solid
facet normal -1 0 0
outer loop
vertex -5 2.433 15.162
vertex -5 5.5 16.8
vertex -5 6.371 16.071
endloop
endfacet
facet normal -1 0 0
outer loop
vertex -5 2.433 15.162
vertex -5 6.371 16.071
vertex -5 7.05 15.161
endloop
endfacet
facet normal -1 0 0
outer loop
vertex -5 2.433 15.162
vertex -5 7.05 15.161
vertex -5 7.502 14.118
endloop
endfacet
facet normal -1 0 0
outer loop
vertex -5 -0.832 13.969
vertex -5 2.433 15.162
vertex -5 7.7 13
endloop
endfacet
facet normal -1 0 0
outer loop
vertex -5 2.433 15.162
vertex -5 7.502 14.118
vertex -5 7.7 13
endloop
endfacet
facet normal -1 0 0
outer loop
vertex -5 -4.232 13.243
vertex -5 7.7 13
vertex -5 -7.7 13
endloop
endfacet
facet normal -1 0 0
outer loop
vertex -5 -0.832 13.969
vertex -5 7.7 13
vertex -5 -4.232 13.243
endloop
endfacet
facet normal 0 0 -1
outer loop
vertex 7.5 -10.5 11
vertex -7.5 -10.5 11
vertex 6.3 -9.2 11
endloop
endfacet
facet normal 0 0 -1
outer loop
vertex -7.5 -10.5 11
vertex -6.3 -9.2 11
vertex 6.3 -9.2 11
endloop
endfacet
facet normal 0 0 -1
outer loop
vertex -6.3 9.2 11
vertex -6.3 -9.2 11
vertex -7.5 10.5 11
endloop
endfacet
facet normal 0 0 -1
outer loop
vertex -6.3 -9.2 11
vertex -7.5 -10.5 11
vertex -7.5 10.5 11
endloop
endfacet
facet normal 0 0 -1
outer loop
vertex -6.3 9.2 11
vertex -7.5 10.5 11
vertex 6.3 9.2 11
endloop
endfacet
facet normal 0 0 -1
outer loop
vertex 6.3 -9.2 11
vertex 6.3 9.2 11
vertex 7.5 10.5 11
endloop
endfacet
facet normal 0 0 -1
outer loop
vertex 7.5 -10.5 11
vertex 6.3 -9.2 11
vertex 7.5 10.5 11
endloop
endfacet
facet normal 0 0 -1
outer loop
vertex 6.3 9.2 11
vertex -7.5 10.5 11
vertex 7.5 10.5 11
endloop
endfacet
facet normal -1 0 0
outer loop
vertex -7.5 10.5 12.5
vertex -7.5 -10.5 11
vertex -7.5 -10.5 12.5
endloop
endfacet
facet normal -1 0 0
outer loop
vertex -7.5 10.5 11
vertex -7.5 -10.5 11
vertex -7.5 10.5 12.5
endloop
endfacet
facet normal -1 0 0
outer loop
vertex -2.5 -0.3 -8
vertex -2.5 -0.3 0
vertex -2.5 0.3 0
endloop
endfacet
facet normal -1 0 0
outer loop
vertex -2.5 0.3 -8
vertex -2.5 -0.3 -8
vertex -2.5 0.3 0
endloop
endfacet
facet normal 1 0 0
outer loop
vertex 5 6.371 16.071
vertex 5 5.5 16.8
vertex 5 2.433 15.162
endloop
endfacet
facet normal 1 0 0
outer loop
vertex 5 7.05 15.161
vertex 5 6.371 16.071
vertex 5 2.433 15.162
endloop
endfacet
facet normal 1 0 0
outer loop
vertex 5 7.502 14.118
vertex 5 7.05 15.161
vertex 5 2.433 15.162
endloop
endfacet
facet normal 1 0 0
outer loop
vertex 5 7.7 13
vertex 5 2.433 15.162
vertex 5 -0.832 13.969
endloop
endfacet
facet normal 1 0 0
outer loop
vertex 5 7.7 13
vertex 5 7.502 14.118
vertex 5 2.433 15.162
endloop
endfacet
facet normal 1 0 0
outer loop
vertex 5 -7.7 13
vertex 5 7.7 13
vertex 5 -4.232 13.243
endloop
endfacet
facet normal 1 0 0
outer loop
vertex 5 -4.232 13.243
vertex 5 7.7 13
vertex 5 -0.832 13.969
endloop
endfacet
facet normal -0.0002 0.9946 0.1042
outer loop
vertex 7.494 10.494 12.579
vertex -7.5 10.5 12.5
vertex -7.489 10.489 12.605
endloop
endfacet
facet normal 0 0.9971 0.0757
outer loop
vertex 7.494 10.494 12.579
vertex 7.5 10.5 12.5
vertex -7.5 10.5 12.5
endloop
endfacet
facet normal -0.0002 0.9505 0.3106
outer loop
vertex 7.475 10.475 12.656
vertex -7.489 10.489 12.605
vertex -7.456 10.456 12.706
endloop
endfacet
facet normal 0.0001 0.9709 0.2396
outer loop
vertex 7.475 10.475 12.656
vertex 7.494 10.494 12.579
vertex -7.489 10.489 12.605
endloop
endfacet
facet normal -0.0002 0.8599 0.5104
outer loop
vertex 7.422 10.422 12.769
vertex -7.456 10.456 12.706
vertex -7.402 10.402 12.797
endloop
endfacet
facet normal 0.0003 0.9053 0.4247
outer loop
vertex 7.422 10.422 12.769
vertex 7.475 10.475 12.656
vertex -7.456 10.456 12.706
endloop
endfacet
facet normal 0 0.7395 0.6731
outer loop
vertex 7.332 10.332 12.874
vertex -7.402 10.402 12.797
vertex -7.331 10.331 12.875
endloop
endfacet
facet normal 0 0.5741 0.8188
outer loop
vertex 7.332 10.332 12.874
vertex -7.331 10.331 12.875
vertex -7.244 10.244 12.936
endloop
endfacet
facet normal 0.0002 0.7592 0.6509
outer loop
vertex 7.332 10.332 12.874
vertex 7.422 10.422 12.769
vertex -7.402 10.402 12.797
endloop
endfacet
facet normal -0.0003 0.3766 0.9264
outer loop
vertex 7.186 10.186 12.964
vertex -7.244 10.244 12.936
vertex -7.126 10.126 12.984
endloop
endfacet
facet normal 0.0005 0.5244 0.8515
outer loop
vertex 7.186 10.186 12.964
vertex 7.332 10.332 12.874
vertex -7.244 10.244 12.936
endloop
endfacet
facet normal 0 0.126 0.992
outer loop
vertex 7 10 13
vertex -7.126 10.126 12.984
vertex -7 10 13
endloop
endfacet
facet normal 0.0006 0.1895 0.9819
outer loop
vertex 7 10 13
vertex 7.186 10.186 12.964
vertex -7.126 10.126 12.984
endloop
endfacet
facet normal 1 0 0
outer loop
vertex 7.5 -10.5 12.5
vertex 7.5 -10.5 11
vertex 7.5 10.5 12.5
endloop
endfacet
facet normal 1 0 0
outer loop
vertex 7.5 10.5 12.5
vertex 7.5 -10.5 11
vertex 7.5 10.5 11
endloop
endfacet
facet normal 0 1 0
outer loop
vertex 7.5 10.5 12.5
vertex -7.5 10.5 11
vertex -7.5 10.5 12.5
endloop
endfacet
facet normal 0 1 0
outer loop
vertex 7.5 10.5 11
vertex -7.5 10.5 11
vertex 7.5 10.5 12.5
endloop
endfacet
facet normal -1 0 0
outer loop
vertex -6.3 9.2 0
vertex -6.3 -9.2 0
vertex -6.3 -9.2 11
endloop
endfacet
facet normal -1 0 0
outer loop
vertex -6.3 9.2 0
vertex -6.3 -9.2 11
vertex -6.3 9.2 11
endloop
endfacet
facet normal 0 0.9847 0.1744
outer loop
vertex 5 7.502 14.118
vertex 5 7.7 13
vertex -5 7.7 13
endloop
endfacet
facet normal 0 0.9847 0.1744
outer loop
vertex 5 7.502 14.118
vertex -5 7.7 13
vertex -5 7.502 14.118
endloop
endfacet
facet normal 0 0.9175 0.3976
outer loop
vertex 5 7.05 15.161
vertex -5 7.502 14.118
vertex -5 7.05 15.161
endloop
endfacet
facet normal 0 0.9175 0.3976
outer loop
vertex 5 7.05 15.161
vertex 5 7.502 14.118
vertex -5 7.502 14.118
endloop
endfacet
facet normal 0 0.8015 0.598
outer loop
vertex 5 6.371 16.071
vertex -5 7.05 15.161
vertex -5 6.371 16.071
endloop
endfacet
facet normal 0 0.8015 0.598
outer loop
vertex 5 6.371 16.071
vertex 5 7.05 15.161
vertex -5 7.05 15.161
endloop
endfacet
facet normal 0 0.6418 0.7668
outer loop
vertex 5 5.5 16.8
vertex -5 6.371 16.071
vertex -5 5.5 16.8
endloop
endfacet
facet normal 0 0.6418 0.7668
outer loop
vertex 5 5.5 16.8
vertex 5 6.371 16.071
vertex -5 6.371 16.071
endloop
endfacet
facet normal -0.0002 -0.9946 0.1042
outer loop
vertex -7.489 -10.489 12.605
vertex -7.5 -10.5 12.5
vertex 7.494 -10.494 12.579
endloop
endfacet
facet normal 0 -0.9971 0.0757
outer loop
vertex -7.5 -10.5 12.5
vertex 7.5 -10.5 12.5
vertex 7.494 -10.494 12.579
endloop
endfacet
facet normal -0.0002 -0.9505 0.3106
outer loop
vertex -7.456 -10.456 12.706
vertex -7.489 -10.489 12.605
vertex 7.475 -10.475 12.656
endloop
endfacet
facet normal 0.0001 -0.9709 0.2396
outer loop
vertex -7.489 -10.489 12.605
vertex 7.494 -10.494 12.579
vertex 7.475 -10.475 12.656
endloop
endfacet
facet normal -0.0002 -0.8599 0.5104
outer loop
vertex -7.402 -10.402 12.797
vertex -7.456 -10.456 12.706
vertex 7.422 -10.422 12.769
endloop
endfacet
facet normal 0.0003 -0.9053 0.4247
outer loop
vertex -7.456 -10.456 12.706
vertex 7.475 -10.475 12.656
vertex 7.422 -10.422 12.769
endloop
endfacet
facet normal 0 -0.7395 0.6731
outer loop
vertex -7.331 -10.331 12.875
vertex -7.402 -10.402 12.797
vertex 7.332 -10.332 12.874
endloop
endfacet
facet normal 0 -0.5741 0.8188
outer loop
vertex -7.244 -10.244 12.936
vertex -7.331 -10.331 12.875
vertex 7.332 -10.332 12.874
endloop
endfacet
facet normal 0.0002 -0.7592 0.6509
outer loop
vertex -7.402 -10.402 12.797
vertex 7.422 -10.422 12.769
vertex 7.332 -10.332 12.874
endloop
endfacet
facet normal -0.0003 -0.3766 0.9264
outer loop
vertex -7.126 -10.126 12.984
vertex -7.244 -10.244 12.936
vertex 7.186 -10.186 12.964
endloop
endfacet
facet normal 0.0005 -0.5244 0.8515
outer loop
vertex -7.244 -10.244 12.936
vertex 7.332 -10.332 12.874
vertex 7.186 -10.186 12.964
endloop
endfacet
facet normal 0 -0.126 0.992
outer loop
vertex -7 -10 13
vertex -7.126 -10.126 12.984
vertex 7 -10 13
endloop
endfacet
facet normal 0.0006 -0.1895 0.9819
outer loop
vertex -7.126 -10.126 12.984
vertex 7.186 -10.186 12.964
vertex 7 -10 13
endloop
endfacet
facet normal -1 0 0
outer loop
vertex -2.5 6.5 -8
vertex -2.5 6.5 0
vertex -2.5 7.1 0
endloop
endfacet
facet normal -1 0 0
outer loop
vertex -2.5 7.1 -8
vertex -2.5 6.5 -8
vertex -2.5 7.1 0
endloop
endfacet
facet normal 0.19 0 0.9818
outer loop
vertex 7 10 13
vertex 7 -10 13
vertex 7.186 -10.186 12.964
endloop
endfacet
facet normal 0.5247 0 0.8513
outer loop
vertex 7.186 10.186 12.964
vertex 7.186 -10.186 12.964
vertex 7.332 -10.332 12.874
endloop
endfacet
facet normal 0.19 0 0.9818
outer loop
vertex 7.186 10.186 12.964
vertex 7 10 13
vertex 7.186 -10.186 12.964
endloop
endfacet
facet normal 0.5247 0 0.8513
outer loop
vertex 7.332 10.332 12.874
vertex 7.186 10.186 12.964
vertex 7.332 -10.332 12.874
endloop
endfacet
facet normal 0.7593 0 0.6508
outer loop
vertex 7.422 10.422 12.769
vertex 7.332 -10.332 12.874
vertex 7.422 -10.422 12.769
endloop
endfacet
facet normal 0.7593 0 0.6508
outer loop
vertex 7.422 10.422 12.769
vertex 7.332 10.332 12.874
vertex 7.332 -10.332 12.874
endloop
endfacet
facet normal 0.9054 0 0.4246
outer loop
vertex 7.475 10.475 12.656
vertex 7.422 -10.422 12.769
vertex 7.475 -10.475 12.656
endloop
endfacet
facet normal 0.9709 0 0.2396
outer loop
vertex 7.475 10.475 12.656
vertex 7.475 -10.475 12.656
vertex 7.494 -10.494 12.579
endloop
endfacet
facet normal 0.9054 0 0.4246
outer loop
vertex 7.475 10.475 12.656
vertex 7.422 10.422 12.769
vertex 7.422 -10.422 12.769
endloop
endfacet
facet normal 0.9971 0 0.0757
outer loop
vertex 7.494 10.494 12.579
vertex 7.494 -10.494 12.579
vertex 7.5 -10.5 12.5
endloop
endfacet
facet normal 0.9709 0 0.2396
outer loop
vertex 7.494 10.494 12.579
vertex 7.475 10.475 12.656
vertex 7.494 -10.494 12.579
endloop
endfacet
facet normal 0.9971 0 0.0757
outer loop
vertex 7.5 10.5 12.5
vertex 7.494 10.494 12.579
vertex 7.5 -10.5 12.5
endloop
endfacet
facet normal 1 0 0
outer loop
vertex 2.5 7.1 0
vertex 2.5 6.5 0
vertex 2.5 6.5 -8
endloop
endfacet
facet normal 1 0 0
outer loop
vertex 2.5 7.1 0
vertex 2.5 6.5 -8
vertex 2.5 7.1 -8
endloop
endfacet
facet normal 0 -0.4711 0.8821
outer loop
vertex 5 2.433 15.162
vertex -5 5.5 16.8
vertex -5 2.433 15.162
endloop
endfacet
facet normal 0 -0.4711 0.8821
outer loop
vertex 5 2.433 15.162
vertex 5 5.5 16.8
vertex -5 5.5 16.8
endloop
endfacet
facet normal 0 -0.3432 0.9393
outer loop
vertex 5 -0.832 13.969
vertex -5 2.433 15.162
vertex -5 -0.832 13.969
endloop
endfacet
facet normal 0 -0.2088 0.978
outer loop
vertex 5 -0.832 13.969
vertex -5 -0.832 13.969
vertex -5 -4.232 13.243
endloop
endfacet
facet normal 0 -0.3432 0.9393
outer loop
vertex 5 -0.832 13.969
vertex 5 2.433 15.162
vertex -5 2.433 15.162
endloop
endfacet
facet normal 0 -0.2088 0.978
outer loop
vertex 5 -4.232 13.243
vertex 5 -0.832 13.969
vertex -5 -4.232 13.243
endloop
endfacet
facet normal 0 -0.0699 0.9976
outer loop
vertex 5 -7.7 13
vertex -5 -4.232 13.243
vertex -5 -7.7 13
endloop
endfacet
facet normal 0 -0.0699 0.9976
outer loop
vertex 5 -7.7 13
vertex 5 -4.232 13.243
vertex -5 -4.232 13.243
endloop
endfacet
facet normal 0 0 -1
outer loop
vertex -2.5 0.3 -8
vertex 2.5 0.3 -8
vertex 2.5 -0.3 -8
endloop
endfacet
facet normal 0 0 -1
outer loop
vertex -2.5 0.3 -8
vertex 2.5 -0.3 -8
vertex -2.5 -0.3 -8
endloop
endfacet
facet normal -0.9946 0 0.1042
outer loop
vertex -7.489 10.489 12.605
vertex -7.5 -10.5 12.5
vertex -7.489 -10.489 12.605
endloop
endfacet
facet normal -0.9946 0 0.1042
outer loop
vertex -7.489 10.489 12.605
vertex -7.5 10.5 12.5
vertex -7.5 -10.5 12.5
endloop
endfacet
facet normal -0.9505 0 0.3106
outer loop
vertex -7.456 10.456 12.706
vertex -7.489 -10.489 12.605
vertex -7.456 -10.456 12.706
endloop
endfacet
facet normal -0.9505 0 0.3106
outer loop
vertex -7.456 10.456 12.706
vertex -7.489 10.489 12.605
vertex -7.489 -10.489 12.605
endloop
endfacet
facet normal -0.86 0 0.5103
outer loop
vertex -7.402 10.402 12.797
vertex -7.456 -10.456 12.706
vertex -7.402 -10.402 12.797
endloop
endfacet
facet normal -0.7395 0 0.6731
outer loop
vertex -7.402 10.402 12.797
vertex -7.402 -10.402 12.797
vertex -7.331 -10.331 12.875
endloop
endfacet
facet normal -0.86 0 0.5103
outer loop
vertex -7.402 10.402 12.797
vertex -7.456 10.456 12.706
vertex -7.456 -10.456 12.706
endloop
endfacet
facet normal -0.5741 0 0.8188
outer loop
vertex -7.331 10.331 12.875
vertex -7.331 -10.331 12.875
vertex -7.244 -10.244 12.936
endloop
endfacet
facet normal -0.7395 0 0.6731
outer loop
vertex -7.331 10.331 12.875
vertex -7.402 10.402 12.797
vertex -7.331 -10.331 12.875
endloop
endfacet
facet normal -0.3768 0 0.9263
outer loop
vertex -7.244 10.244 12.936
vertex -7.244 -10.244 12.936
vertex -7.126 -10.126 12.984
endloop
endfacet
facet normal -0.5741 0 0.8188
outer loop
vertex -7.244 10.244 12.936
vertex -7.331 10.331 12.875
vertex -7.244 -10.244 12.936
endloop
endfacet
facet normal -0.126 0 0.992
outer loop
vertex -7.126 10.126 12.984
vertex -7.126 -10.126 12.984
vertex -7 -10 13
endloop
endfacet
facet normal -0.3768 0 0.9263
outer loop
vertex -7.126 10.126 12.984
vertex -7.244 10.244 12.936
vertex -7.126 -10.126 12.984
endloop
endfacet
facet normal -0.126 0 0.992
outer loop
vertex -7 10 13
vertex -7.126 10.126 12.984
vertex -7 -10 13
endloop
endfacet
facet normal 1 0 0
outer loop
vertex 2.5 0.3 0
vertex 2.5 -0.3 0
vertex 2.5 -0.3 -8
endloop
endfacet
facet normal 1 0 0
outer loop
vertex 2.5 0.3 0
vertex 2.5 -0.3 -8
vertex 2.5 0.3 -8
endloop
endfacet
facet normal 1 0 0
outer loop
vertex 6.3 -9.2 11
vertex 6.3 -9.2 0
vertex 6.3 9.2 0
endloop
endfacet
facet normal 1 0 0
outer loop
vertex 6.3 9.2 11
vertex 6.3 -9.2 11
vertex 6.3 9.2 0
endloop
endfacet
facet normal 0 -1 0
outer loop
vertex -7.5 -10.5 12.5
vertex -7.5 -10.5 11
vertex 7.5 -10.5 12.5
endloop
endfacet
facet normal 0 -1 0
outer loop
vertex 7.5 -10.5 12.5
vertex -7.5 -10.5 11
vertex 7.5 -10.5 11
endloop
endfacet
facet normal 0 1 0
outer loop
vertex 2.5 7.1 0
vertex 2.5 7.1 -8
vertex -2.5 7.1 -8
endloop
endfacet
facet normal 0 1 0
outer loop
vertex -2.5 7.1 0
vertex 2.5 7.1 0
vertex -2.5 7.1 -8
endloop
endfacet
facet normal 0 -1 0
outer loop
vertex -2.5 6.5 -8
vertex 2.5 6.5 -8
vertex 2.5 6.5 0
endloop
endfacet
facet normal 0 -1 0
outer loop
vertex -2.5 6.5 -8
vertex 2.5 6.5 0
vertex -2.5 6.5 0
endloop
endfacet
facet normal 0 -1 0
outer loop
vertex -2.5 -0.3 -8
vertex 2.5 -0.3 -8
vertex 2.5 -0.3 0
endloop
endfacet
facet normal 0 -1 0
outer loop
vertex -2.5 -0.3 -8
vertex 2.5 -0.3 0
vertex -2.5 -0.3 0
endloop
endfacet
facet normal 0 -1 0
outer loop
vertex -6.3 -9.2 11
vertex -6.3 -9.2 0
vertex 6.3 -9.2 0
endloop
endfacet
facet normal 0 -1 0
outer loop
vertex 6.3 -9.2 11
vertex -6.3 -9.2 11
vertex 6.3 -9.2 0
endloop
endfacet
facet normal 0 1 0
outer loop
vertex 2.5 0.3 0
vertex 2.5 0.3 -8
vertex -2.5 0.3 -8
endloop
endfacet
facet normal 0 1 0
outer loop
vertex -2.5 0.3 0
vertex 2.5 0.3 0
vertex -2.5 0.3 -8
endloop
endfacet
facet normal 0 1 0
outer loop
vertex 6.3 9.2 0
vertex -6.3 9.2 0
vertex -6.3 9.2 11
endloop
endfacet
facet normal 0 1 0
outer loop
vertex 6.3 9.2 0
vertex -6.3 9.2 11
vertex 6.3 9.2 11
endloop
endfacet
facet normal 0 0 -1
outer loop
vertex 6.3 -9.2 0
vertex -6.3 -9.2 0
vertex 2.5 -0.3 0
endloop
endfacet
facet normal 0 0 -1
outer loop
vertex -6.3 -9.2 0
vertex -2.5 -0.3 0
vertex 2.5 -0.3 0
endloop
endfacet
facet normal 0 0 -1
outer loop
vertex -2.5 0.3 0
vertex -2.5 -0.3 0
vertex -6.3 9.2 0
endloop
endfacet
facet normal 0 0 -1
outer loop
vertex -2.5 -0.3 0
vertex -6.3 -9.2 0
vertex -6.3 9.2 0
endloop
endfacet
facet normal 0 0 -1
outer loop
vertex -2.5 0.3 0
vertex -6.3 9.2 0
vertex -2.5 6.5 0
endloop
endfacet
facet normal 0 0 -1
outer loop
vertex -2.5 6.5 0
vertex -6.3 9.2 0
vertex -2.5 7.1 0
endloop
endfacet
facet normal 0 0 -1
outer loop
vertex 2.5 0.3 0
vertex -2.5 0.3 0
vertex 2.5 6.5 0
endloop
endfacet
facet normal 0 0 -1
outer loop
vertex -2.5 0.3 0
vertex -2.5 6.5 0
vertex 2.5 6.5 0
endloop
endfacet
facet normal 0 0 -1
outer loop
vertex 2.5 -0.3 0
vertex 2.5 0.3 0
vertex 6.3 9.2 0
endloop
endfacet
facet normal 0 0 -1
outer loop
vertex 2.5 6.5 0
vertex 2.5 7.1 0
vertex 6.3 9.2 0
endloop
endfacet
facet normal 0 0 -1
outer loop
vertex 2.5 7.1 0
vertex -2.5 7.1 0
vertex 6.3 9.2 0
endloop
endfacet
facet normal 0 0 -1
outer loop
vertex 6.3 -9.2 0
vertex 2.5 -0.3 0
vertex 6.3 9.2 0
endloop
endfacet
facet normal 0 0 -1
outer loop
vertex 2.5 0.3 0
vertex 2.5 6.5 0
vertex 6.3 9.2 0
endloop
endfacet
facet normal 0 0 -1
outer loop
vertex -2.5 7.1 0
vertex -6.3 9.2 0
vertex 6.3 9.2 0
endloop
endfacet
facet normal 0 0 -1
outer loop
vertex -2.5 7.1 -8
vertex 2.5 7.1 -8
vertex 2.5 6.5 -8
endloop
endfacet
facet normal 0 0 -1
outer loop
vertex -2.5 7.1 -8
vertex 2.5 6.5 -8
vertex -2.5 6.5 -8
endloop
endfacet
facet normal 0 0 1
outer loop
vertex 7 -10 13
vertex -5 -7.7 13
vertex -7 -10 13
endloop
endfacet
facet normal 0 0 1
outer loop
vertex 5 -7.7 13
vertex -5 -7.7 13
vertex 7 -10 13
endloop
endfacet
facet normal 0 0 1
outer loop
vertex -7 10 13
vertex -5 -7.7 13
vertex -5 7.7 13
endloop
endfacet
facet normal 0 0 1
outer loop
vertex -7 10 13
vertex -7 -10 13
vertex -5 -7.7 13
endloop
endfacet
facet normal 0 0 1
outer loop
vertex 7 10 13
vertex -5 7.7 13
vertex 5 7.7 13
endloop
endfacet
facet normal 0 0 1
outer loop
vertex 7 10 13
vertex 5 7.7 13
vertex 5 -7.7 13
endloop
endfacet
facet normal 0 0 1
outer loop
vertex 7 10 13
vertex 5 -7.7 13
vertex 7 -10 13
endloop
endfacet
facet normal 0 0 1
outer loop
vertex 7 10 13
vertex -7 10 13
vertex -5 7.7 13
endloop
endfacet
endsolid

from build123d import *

# Parameters (mm, degrees)
SKETCH_1_W             = 12.6
SKETCH_1_H             = 18.4
EXTRUDE_1_DEPTH        = 11
SKETCH_2_W             = 15
SKETCH_2_H             = 21
EXTRUDE_2_DEPTH        = 2
FILLET_1_R             = 0.5
EXTRUDE_3_DEPTH        = 5
SKETCH_4_W             = 5
SKETCH_4_H             = 0.6
EXTRUDE_4_DEPTH        = 8
PATTERN_LINEAR_1_COUNT = 2
PATTERN_LINEAR_1_PITCH = 6.8


with BuildPart() as part:
    # Эскиз1 → Бобышка-Вытянуть1 (new body)
    with BuildSketch(Plane.XY):
        Rectangle(SKETCH_1_W, SKETCH_1_H)
    extrude(amount=EXTRUDE_1_DEPTH)

    # Эскиз2 → Бобышка-Вытянуть2 (add)
    with BuildSketch(Plane.XY.offset(11)):
        Rectangle(SKETCH_2_W, SKETCH_2_H)
    extrude(amount=EXTRUDE_2_DEPTH)

    # Скругление1
    fillet_1_edges = [part.edges().sort_by_distance(p)[0] for p in [
        (7.5, 0, 13),
        (0, 10.5, 13),
        (-7.5, 0, 13),
        (0, -10.5, 13),
    ]]
    fillet(fillet_1_edges, radius=FILLET_1_R)

    # Эскиз3 → Бобышка-Вытянуть3 (add, symmetric)
    with BuildSketch(Plane(origin=(0, 0, 0), x_dir=(0, 0, -1), z_dir=(1, 0, 0))):
        with BuildLine():
            Line((-13, -7.7), (-13, 7.7))
            ThreePointArc((-13, 7.7), (-15.160810119, 7.050490206), (-16.8, 5.5))
            ThreePointArc((-16.8, 5.5), (-13.968906968, -0.831958067), (-13, -7.7))
        make_face()
    extrude(amount=EXTRUDE_3_DEPTH, both=True)

    # Эскиз4 → Бобышка-Вытянуть4 (add)
    with BuildSketch(Plane(origin=(0, 0, 0), x_dir=(-1, 0, 0), z_dir=(0, 0, -1))):
        Rectangle(SKETCH_4_W, SKETCH_4_H)
    extrude_4 = extrude(amount=EXTRUDE_4_DEPTH)

    # Линейный массив1: Бобышка-Вытянуть4 ×2
    with Locations(*[(0, i * PATTERN_LINEAR_1_PITCH, 0) for i in range(1, PATTERN_LINEAR_1_COUNT)]):
        add(extrude_4)


solid = part.part
